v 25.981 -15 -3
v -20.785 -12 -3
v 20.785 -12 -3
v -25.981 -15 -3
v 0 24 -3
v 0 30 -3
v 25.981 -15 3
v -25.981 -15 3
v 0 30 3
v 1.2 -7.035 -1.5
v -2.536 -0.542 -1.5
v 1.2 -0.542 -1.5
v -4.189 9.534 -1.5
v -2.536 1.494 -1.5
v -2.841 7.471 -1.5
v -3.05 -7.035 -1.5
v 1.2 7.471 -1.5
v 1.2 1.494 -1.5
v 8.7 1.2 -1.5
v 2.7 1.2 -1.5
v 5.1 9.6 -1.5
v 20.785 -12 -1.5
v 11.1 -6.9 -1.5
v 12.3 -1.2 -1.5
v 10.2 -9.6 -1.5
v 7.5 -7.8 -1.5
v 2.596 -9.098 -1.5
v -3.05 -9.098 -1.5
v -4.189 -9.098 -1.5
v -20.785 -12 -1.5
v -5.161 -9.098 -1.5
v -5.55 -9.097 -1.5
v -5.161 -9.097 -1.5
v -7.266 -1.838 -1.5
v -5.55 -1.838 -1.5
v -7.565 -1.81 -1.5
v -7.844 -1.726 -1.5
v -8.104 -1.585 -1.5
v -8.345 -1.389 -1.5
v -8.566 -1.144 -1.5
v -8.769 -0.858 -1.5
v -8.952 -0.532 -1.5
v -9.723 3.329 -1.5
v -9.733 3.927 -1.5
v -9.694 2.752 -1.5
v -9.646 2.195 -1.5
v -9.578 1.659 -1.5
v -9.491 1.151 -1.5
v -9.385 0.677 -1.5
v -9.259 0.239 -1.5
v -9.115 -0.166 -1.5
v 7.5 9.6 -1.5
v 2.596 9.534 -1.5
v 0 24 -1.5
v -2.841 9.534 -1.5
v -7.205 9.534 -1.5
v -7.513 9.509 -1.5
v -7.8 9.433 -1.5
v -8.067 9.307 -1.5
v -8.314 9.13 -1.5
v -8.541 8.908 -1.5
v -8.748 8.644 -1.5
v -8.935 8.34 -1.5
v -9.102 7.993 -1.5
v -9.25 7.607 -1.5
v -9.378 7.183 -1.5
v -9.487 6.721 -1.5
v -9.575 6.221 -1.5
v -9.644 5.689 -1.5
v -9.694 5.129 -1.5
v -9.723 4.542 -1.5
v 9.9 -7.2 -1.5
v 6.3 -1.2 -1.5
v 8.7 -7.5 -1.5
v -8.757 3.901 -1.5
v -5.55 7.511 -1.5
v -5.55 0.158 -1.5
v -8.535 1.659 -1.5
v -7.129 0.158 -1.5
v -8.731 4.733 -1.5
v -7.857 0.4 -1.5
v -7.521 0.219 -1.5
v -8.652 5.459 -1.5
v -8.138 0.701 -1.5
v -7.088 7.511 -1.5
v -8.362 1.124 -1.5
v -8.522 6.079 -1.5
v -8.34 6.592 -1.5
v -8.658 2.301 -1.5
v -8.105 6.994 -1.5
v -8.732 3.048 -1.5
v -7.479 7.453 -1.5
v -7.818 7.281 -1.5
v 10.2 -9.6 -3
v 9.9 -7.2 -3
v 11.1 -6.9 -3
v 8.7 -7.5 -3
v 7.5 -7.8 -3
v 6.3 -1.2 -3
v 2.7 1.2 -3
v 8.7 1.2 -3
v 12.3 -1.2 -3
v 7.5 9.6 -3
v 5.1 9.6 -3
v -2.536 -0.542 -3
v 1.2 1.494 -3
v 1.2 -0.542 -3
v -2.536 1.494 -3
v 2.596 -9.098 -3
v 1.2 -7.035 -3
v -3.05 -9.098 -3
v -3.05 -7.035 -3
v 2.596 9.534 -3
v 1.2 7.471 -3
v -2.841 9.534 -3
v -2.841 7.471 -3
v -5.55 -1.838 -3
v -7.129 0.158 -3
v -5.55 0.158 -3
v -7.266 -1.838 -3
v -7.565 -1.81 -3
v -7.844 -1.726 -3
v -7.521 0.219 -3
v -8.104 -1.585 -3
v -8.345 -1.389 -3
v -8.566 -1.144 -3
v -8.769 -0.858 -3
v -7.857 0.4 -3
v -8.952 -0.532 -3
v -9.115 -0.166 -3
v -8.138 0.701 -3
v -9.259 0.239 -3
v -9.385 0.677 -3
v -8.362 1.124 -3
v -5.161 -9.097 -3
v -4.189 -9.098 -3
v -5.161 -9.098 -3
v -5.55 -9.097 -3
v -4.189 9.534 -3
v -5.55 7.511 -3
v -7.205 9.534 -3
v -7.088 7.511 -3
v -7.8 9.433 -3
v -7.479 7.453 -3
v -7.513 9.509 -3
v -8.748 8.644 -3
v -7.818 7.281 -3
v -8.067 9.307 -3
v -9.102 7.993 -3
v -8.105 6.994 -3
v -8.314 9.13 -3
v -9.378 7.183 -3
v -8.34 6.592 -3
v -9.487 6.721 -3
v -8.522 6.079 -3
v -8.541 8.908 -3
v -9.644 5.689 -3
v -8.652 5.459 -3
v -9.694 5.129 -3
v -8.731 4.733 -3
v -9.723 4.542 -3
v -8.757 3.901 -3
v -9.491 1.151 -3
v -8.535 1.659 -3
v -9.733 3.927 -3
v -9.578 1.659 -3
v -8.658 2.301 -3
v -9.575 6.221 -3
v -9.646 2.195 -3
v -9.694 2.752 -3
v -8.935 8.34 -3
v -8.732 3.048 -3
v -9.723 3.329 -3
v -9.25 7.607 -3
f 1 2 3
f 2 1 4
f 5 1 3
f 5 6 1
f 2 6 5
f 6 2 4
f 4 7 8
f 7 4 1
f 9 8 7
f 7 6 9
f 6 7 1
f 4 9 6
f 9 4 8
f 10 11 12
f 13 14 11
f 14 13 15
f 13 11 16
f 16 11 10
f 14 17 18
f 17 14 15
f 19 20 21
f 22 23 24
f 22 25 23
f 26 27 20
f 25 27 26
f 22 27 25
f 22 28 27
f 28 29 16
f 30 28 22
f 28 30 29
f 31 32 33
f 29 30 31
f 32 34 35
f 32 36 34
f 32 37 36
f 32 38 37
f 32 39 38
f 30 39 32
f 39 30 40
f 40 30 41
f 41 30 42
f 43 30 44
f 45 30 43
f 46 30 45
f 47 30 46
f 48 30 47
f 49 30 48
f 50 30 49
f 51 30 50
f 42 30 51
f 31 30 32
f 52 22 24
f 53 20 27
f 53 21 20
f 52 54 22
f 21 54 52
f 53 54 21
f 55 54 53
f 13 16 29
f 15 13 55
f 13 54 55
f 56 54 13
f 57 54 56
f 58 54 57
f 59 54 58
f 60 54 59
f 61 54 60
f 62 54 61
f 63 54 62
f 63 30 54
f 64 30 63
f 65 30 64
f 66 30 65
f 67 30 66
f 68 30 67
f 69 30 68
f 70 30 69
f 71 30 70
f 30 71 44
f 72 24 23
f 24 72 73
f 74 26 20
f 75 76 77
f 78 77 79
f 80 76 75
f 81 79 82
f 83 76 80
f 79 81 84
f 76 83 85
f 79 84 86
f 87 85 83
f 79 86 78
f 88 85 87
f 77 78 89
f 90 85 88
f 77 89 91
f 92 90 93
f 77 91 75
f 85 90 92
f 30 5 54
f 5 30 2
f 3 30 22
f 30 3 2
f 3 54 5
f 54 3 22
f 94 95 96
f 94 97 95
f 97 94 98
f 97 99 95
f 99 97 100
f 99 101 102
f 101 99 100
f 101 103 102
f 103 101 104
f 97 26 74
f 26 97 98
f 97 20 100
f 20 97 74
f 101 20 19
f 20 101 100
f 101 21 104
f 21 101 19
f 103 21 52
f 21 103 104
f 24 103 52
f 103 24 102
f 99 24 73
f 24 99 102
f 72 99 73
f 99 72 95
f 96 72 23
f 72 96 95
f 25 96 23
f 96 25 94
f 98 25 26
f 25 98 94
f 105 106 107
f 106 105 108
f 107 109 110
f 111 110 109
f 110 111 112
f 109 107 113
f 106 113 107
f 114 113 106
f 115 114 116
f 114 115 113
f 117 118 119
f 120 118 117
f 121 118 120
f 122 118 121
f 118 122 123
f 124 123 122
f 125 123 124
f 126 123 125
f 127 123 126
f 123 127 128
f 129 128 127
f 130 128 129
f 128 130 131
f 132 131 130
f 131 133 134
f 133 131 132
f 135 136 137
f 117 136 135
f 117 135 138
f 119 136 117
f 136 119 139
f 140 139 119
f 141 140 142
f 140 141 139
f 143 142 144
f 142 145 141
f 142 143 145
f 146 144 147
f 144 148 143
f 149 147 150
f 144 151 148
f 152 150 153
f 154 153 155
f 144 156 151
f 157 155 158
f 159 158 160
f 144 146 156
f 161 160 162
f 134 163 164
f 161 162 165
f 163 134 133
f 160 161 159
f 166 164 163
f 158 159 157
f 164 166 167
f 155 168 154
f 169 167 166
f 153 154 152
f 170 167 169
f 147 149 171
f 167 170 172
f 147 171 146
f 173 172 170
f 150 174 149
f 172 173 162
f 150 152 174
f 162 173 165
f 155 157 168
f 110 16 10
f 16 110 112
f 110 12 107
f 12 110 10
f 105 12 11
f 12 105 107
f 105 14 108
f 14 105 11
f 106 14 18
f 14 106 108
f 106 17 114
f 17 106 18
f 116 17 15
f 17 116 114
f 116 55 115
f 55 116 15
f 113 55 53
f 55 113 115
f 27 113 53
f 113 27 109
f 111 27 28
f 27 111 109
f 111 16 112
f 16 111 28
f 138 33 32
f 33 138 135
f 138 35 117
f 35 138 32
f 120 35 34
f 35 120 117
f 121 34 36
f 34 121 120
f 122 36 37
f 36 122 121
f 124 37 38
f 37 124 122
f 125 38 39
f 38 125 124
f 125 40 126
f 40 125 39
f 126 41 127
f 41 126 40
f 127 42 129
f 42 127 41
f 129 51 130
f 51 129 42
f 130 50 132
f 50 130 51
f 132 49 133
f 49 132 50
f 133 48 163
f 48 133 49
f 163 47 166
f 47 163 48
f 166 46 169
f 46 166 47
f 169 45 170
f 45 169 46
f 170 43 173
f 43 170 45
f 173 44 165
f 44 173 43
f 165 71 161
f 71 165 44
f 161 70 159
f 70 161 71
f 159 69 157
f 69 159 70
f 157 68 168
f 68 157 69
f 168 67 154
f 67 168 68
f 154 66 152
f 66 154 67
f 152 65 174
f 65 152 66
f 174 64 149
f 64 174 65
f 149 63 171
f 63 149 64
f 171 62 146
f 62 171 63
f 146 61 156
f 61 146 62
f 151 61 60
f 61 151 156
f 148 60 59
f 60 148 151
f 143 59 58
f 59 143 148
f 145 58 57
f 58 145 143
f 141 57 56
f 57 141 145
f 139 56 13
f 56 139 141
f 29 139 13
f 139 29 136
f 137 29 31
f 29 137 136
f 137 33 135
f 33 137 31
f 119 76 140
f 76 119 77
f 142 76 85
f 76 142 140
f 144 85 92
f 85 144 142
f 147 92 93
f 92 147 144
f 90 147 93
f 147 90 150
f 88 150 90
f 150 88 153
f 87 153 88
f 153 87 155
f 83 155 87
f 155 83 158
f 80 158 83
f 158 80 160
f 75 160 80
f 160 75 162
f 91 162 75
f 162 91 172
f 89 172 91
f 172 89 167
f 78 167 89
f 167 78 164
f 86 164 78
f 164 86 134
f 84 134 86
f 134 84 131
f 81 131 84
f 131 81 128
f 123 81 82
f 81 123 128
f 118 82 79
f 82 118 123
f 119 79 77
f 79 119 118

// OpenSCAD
r = 20;
module triangle(l, r){
    linear_extrude(l){
        polygon([
            [cos(90)*r, sin(90)*r],
            [cos(210)*r, sin(210)*r],
            [cos(330)*r, sin(330)*r]
        ]);
    }
}

module pin_part(){
            translate([0,0,2])
            rotate([0, 90, 90])
            cube([2, 2, 4], center = true);
            
            translate([0,4,0.65])
            rotate([60, 0, 0])
            cube([2, 2, 6], center = true);
            
            translate([0,-4,0.65])
            rotate([-60, 0, 0])
            cube([2, 2, 6], center = true);
}

scale([1.5, 1.5, 1.5])
union(){
    difference(){
        color("black")
        translate([0, 0, -2])
        triangle(4, r);
        
        color("yellow")
        rotate([0, 180, 0])
        translate([0, 0, 1])
        triangle(2, r-4);
        
    }

    color("black")
    translate([5, 0, 0])
    scale([0.8, 0.8, 1])
    rotate([0, 180, 0])
    translate([0, 0, 1])
    linear_extrude(1){
        
        polygon(
            [
            [0, 8],
            [2, 8],
            [-1, 1],
            [4,  1],
            [-1, -6.25],
            [0, -6.5],
            [-2.25, -8],
            [-3, -5.75],
            [-2, -6],
            [1, -1],
            [-4,-1]
        ]
        );
    };
    color("black")
    translate([2.3, 0, 0])
    scale([0.5, 1.3, 1])
    rotate([0, 180, 0])
    translate([0, 0, 1])
    linear_extrude(1){
        text("EP", size = 20, "3270 Nerd Font", halign="left", valign="center");
        translate([2.5, 0, 0])
        square([1, 9], center=true);
        translate([11.5, 0, 0])
        square([1, 9.33], center=true);
    };
}
